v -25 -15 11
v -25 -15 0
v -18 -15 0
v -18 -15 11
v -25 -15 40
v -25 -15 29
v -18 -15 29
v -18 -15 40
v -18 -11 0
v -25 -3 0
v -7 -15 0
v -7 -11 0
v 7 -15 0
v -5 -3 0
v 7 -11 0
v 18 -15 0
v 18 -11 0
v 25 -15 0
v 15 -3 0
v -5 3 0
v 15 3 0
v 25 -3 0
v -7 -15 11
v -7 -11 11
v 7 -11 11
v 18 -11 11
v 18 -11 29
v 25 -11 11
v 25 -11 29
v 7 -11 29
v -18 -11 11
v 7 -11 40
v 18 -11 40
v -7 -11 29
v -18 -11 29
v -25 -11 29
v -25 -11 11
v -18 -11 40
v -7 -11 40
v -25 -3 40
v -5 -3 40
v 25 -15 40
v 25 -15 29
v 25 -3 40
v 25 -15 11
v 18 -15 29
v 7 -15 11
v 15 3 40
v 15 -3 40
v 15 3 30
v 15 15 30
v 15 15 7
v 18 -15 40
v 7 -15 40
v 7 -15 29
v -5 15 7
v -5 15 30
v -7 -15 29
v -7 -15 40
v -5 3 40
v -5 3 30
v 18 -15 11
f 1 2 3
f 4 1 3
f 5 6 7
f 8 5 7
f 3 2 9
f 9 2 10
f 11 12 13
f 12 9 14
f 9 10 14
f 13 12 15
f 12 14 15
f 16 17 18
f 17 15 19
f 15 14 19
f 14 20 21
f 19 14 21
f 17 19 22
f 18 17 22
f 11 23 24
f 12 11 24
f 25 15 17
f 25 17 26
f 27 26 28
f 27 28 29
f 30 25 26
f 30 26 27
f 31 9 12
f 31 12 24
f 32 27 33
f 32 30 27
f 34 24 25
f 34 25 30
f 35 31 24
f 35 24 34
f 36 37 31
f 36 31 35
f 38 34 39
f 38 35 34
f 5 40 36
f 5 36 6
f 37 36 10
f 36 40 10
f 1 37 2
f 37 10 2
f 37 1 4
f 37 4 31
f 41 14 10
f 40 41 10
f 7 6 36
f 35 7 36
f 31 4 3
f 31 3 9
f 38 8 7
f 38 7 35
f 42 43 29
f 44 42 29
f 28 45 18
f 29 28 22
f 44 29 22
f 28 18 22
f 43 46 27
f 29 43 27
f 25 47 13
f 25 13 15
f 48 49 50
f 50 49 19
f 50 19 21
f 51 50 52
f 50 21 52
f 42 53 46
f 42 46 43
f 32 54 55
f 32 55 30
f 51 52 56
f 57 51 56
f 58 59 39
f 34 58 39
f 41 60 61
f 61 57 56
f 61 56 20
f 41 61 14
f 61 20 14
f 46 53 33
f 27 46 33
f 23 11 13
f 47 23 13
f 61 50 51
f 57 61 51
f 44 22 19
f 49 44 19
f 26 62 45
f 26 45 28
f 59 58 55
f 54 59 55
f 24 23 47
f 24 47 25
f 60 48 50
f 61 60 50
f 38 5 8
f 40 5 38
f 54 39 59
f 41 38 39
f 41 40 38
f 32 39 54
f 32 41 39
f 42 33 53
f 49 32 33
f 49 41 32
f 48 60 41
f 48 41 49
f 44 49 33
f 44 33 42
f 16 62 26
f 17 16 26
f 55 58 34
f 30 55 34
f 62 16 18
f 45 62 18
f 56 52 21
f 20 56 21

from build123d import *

# Parameters (mm, degrees)
EXTRUDE_1_DEPTH     = 40
SKETCH_2_W          = 18
SKETCH_2_H          = 4
CUT_EXTRUDE_1_DEPTH = 66.76473219
SKETCH_3_W          = 11
SKETCH_3_H          = 4
CUT_EXTRUDE_2_DEPTH = 50.497474683
SKETCH_4_W          = 10
SKETCH_4_H          = 12
CUT_EXTRUDE_3_DEPTH = 59.523499554


with BuildPart() as part:
    # Эскиз1 → Бобышка-Вытянуть1 (new body)
    with BuildSketch(Plane.XY):
        Polygon((-5, -3), (-25, -3), (-25, -15), (25, -15), (25, -3), (15, -3), (15, 15), (-5, 15), align=None)
    extrude(amount=EXTRUDE_1_DEPTH)

    # Эскиз2 → Вырез-Вытянуть1 (cut, through all)
    with BuildSketch(Plane.ZY.offset(25)):
        with Locations((20, -13)):
            Rectangle(SKETCH_2_W, SKETCH_2_H)
    extrude(amount=-CUT_EXTRUDE_1_DEPTH, mode=Mode.SUBTRACT)

    # Эскиз3 → Вырез-Вытянуть2 (cut, through all)
    with BuildSketch(Plane.XY.offset(40)):
        with Locations((-12.5, -13)):
            Rectangle(SKETCH_3_W, SKETCH_3_H)
    cut_extrude_2 = extrude(amount=-CUT_EXTRUDE_2_DEPTH, mode=Mode.SUBTRACT)

    # Зеркальное отражение1: Вырез-Вытянуть2 across plane
    add(cut_extrude_2.mirror(Plane(origin=(0, 0, 0), x_dir=(0, 0, 1), z_dir=(1, 0, 0))), mode=Mode.SUBTRACT)

    # Эскиз4 → Вырез-Вытянуть3 (cut, through all)
    with BuildSketch(Plane(origin=(15, 0, 0), x_dir=(0, 0, -1), z_dir=(1, 0, 0))):
        Polygon((-7, 15), (0, 3), (0, 15), align=None)
        with Locations((-35, 9)):
            Rectangle(SKETCH_4_W, SKETCH_4_H)
    extrude(amount=-CUT_EXTRUDE_3_DEPTH, mode=Mode.SUBTRACT)


solid = part.part
